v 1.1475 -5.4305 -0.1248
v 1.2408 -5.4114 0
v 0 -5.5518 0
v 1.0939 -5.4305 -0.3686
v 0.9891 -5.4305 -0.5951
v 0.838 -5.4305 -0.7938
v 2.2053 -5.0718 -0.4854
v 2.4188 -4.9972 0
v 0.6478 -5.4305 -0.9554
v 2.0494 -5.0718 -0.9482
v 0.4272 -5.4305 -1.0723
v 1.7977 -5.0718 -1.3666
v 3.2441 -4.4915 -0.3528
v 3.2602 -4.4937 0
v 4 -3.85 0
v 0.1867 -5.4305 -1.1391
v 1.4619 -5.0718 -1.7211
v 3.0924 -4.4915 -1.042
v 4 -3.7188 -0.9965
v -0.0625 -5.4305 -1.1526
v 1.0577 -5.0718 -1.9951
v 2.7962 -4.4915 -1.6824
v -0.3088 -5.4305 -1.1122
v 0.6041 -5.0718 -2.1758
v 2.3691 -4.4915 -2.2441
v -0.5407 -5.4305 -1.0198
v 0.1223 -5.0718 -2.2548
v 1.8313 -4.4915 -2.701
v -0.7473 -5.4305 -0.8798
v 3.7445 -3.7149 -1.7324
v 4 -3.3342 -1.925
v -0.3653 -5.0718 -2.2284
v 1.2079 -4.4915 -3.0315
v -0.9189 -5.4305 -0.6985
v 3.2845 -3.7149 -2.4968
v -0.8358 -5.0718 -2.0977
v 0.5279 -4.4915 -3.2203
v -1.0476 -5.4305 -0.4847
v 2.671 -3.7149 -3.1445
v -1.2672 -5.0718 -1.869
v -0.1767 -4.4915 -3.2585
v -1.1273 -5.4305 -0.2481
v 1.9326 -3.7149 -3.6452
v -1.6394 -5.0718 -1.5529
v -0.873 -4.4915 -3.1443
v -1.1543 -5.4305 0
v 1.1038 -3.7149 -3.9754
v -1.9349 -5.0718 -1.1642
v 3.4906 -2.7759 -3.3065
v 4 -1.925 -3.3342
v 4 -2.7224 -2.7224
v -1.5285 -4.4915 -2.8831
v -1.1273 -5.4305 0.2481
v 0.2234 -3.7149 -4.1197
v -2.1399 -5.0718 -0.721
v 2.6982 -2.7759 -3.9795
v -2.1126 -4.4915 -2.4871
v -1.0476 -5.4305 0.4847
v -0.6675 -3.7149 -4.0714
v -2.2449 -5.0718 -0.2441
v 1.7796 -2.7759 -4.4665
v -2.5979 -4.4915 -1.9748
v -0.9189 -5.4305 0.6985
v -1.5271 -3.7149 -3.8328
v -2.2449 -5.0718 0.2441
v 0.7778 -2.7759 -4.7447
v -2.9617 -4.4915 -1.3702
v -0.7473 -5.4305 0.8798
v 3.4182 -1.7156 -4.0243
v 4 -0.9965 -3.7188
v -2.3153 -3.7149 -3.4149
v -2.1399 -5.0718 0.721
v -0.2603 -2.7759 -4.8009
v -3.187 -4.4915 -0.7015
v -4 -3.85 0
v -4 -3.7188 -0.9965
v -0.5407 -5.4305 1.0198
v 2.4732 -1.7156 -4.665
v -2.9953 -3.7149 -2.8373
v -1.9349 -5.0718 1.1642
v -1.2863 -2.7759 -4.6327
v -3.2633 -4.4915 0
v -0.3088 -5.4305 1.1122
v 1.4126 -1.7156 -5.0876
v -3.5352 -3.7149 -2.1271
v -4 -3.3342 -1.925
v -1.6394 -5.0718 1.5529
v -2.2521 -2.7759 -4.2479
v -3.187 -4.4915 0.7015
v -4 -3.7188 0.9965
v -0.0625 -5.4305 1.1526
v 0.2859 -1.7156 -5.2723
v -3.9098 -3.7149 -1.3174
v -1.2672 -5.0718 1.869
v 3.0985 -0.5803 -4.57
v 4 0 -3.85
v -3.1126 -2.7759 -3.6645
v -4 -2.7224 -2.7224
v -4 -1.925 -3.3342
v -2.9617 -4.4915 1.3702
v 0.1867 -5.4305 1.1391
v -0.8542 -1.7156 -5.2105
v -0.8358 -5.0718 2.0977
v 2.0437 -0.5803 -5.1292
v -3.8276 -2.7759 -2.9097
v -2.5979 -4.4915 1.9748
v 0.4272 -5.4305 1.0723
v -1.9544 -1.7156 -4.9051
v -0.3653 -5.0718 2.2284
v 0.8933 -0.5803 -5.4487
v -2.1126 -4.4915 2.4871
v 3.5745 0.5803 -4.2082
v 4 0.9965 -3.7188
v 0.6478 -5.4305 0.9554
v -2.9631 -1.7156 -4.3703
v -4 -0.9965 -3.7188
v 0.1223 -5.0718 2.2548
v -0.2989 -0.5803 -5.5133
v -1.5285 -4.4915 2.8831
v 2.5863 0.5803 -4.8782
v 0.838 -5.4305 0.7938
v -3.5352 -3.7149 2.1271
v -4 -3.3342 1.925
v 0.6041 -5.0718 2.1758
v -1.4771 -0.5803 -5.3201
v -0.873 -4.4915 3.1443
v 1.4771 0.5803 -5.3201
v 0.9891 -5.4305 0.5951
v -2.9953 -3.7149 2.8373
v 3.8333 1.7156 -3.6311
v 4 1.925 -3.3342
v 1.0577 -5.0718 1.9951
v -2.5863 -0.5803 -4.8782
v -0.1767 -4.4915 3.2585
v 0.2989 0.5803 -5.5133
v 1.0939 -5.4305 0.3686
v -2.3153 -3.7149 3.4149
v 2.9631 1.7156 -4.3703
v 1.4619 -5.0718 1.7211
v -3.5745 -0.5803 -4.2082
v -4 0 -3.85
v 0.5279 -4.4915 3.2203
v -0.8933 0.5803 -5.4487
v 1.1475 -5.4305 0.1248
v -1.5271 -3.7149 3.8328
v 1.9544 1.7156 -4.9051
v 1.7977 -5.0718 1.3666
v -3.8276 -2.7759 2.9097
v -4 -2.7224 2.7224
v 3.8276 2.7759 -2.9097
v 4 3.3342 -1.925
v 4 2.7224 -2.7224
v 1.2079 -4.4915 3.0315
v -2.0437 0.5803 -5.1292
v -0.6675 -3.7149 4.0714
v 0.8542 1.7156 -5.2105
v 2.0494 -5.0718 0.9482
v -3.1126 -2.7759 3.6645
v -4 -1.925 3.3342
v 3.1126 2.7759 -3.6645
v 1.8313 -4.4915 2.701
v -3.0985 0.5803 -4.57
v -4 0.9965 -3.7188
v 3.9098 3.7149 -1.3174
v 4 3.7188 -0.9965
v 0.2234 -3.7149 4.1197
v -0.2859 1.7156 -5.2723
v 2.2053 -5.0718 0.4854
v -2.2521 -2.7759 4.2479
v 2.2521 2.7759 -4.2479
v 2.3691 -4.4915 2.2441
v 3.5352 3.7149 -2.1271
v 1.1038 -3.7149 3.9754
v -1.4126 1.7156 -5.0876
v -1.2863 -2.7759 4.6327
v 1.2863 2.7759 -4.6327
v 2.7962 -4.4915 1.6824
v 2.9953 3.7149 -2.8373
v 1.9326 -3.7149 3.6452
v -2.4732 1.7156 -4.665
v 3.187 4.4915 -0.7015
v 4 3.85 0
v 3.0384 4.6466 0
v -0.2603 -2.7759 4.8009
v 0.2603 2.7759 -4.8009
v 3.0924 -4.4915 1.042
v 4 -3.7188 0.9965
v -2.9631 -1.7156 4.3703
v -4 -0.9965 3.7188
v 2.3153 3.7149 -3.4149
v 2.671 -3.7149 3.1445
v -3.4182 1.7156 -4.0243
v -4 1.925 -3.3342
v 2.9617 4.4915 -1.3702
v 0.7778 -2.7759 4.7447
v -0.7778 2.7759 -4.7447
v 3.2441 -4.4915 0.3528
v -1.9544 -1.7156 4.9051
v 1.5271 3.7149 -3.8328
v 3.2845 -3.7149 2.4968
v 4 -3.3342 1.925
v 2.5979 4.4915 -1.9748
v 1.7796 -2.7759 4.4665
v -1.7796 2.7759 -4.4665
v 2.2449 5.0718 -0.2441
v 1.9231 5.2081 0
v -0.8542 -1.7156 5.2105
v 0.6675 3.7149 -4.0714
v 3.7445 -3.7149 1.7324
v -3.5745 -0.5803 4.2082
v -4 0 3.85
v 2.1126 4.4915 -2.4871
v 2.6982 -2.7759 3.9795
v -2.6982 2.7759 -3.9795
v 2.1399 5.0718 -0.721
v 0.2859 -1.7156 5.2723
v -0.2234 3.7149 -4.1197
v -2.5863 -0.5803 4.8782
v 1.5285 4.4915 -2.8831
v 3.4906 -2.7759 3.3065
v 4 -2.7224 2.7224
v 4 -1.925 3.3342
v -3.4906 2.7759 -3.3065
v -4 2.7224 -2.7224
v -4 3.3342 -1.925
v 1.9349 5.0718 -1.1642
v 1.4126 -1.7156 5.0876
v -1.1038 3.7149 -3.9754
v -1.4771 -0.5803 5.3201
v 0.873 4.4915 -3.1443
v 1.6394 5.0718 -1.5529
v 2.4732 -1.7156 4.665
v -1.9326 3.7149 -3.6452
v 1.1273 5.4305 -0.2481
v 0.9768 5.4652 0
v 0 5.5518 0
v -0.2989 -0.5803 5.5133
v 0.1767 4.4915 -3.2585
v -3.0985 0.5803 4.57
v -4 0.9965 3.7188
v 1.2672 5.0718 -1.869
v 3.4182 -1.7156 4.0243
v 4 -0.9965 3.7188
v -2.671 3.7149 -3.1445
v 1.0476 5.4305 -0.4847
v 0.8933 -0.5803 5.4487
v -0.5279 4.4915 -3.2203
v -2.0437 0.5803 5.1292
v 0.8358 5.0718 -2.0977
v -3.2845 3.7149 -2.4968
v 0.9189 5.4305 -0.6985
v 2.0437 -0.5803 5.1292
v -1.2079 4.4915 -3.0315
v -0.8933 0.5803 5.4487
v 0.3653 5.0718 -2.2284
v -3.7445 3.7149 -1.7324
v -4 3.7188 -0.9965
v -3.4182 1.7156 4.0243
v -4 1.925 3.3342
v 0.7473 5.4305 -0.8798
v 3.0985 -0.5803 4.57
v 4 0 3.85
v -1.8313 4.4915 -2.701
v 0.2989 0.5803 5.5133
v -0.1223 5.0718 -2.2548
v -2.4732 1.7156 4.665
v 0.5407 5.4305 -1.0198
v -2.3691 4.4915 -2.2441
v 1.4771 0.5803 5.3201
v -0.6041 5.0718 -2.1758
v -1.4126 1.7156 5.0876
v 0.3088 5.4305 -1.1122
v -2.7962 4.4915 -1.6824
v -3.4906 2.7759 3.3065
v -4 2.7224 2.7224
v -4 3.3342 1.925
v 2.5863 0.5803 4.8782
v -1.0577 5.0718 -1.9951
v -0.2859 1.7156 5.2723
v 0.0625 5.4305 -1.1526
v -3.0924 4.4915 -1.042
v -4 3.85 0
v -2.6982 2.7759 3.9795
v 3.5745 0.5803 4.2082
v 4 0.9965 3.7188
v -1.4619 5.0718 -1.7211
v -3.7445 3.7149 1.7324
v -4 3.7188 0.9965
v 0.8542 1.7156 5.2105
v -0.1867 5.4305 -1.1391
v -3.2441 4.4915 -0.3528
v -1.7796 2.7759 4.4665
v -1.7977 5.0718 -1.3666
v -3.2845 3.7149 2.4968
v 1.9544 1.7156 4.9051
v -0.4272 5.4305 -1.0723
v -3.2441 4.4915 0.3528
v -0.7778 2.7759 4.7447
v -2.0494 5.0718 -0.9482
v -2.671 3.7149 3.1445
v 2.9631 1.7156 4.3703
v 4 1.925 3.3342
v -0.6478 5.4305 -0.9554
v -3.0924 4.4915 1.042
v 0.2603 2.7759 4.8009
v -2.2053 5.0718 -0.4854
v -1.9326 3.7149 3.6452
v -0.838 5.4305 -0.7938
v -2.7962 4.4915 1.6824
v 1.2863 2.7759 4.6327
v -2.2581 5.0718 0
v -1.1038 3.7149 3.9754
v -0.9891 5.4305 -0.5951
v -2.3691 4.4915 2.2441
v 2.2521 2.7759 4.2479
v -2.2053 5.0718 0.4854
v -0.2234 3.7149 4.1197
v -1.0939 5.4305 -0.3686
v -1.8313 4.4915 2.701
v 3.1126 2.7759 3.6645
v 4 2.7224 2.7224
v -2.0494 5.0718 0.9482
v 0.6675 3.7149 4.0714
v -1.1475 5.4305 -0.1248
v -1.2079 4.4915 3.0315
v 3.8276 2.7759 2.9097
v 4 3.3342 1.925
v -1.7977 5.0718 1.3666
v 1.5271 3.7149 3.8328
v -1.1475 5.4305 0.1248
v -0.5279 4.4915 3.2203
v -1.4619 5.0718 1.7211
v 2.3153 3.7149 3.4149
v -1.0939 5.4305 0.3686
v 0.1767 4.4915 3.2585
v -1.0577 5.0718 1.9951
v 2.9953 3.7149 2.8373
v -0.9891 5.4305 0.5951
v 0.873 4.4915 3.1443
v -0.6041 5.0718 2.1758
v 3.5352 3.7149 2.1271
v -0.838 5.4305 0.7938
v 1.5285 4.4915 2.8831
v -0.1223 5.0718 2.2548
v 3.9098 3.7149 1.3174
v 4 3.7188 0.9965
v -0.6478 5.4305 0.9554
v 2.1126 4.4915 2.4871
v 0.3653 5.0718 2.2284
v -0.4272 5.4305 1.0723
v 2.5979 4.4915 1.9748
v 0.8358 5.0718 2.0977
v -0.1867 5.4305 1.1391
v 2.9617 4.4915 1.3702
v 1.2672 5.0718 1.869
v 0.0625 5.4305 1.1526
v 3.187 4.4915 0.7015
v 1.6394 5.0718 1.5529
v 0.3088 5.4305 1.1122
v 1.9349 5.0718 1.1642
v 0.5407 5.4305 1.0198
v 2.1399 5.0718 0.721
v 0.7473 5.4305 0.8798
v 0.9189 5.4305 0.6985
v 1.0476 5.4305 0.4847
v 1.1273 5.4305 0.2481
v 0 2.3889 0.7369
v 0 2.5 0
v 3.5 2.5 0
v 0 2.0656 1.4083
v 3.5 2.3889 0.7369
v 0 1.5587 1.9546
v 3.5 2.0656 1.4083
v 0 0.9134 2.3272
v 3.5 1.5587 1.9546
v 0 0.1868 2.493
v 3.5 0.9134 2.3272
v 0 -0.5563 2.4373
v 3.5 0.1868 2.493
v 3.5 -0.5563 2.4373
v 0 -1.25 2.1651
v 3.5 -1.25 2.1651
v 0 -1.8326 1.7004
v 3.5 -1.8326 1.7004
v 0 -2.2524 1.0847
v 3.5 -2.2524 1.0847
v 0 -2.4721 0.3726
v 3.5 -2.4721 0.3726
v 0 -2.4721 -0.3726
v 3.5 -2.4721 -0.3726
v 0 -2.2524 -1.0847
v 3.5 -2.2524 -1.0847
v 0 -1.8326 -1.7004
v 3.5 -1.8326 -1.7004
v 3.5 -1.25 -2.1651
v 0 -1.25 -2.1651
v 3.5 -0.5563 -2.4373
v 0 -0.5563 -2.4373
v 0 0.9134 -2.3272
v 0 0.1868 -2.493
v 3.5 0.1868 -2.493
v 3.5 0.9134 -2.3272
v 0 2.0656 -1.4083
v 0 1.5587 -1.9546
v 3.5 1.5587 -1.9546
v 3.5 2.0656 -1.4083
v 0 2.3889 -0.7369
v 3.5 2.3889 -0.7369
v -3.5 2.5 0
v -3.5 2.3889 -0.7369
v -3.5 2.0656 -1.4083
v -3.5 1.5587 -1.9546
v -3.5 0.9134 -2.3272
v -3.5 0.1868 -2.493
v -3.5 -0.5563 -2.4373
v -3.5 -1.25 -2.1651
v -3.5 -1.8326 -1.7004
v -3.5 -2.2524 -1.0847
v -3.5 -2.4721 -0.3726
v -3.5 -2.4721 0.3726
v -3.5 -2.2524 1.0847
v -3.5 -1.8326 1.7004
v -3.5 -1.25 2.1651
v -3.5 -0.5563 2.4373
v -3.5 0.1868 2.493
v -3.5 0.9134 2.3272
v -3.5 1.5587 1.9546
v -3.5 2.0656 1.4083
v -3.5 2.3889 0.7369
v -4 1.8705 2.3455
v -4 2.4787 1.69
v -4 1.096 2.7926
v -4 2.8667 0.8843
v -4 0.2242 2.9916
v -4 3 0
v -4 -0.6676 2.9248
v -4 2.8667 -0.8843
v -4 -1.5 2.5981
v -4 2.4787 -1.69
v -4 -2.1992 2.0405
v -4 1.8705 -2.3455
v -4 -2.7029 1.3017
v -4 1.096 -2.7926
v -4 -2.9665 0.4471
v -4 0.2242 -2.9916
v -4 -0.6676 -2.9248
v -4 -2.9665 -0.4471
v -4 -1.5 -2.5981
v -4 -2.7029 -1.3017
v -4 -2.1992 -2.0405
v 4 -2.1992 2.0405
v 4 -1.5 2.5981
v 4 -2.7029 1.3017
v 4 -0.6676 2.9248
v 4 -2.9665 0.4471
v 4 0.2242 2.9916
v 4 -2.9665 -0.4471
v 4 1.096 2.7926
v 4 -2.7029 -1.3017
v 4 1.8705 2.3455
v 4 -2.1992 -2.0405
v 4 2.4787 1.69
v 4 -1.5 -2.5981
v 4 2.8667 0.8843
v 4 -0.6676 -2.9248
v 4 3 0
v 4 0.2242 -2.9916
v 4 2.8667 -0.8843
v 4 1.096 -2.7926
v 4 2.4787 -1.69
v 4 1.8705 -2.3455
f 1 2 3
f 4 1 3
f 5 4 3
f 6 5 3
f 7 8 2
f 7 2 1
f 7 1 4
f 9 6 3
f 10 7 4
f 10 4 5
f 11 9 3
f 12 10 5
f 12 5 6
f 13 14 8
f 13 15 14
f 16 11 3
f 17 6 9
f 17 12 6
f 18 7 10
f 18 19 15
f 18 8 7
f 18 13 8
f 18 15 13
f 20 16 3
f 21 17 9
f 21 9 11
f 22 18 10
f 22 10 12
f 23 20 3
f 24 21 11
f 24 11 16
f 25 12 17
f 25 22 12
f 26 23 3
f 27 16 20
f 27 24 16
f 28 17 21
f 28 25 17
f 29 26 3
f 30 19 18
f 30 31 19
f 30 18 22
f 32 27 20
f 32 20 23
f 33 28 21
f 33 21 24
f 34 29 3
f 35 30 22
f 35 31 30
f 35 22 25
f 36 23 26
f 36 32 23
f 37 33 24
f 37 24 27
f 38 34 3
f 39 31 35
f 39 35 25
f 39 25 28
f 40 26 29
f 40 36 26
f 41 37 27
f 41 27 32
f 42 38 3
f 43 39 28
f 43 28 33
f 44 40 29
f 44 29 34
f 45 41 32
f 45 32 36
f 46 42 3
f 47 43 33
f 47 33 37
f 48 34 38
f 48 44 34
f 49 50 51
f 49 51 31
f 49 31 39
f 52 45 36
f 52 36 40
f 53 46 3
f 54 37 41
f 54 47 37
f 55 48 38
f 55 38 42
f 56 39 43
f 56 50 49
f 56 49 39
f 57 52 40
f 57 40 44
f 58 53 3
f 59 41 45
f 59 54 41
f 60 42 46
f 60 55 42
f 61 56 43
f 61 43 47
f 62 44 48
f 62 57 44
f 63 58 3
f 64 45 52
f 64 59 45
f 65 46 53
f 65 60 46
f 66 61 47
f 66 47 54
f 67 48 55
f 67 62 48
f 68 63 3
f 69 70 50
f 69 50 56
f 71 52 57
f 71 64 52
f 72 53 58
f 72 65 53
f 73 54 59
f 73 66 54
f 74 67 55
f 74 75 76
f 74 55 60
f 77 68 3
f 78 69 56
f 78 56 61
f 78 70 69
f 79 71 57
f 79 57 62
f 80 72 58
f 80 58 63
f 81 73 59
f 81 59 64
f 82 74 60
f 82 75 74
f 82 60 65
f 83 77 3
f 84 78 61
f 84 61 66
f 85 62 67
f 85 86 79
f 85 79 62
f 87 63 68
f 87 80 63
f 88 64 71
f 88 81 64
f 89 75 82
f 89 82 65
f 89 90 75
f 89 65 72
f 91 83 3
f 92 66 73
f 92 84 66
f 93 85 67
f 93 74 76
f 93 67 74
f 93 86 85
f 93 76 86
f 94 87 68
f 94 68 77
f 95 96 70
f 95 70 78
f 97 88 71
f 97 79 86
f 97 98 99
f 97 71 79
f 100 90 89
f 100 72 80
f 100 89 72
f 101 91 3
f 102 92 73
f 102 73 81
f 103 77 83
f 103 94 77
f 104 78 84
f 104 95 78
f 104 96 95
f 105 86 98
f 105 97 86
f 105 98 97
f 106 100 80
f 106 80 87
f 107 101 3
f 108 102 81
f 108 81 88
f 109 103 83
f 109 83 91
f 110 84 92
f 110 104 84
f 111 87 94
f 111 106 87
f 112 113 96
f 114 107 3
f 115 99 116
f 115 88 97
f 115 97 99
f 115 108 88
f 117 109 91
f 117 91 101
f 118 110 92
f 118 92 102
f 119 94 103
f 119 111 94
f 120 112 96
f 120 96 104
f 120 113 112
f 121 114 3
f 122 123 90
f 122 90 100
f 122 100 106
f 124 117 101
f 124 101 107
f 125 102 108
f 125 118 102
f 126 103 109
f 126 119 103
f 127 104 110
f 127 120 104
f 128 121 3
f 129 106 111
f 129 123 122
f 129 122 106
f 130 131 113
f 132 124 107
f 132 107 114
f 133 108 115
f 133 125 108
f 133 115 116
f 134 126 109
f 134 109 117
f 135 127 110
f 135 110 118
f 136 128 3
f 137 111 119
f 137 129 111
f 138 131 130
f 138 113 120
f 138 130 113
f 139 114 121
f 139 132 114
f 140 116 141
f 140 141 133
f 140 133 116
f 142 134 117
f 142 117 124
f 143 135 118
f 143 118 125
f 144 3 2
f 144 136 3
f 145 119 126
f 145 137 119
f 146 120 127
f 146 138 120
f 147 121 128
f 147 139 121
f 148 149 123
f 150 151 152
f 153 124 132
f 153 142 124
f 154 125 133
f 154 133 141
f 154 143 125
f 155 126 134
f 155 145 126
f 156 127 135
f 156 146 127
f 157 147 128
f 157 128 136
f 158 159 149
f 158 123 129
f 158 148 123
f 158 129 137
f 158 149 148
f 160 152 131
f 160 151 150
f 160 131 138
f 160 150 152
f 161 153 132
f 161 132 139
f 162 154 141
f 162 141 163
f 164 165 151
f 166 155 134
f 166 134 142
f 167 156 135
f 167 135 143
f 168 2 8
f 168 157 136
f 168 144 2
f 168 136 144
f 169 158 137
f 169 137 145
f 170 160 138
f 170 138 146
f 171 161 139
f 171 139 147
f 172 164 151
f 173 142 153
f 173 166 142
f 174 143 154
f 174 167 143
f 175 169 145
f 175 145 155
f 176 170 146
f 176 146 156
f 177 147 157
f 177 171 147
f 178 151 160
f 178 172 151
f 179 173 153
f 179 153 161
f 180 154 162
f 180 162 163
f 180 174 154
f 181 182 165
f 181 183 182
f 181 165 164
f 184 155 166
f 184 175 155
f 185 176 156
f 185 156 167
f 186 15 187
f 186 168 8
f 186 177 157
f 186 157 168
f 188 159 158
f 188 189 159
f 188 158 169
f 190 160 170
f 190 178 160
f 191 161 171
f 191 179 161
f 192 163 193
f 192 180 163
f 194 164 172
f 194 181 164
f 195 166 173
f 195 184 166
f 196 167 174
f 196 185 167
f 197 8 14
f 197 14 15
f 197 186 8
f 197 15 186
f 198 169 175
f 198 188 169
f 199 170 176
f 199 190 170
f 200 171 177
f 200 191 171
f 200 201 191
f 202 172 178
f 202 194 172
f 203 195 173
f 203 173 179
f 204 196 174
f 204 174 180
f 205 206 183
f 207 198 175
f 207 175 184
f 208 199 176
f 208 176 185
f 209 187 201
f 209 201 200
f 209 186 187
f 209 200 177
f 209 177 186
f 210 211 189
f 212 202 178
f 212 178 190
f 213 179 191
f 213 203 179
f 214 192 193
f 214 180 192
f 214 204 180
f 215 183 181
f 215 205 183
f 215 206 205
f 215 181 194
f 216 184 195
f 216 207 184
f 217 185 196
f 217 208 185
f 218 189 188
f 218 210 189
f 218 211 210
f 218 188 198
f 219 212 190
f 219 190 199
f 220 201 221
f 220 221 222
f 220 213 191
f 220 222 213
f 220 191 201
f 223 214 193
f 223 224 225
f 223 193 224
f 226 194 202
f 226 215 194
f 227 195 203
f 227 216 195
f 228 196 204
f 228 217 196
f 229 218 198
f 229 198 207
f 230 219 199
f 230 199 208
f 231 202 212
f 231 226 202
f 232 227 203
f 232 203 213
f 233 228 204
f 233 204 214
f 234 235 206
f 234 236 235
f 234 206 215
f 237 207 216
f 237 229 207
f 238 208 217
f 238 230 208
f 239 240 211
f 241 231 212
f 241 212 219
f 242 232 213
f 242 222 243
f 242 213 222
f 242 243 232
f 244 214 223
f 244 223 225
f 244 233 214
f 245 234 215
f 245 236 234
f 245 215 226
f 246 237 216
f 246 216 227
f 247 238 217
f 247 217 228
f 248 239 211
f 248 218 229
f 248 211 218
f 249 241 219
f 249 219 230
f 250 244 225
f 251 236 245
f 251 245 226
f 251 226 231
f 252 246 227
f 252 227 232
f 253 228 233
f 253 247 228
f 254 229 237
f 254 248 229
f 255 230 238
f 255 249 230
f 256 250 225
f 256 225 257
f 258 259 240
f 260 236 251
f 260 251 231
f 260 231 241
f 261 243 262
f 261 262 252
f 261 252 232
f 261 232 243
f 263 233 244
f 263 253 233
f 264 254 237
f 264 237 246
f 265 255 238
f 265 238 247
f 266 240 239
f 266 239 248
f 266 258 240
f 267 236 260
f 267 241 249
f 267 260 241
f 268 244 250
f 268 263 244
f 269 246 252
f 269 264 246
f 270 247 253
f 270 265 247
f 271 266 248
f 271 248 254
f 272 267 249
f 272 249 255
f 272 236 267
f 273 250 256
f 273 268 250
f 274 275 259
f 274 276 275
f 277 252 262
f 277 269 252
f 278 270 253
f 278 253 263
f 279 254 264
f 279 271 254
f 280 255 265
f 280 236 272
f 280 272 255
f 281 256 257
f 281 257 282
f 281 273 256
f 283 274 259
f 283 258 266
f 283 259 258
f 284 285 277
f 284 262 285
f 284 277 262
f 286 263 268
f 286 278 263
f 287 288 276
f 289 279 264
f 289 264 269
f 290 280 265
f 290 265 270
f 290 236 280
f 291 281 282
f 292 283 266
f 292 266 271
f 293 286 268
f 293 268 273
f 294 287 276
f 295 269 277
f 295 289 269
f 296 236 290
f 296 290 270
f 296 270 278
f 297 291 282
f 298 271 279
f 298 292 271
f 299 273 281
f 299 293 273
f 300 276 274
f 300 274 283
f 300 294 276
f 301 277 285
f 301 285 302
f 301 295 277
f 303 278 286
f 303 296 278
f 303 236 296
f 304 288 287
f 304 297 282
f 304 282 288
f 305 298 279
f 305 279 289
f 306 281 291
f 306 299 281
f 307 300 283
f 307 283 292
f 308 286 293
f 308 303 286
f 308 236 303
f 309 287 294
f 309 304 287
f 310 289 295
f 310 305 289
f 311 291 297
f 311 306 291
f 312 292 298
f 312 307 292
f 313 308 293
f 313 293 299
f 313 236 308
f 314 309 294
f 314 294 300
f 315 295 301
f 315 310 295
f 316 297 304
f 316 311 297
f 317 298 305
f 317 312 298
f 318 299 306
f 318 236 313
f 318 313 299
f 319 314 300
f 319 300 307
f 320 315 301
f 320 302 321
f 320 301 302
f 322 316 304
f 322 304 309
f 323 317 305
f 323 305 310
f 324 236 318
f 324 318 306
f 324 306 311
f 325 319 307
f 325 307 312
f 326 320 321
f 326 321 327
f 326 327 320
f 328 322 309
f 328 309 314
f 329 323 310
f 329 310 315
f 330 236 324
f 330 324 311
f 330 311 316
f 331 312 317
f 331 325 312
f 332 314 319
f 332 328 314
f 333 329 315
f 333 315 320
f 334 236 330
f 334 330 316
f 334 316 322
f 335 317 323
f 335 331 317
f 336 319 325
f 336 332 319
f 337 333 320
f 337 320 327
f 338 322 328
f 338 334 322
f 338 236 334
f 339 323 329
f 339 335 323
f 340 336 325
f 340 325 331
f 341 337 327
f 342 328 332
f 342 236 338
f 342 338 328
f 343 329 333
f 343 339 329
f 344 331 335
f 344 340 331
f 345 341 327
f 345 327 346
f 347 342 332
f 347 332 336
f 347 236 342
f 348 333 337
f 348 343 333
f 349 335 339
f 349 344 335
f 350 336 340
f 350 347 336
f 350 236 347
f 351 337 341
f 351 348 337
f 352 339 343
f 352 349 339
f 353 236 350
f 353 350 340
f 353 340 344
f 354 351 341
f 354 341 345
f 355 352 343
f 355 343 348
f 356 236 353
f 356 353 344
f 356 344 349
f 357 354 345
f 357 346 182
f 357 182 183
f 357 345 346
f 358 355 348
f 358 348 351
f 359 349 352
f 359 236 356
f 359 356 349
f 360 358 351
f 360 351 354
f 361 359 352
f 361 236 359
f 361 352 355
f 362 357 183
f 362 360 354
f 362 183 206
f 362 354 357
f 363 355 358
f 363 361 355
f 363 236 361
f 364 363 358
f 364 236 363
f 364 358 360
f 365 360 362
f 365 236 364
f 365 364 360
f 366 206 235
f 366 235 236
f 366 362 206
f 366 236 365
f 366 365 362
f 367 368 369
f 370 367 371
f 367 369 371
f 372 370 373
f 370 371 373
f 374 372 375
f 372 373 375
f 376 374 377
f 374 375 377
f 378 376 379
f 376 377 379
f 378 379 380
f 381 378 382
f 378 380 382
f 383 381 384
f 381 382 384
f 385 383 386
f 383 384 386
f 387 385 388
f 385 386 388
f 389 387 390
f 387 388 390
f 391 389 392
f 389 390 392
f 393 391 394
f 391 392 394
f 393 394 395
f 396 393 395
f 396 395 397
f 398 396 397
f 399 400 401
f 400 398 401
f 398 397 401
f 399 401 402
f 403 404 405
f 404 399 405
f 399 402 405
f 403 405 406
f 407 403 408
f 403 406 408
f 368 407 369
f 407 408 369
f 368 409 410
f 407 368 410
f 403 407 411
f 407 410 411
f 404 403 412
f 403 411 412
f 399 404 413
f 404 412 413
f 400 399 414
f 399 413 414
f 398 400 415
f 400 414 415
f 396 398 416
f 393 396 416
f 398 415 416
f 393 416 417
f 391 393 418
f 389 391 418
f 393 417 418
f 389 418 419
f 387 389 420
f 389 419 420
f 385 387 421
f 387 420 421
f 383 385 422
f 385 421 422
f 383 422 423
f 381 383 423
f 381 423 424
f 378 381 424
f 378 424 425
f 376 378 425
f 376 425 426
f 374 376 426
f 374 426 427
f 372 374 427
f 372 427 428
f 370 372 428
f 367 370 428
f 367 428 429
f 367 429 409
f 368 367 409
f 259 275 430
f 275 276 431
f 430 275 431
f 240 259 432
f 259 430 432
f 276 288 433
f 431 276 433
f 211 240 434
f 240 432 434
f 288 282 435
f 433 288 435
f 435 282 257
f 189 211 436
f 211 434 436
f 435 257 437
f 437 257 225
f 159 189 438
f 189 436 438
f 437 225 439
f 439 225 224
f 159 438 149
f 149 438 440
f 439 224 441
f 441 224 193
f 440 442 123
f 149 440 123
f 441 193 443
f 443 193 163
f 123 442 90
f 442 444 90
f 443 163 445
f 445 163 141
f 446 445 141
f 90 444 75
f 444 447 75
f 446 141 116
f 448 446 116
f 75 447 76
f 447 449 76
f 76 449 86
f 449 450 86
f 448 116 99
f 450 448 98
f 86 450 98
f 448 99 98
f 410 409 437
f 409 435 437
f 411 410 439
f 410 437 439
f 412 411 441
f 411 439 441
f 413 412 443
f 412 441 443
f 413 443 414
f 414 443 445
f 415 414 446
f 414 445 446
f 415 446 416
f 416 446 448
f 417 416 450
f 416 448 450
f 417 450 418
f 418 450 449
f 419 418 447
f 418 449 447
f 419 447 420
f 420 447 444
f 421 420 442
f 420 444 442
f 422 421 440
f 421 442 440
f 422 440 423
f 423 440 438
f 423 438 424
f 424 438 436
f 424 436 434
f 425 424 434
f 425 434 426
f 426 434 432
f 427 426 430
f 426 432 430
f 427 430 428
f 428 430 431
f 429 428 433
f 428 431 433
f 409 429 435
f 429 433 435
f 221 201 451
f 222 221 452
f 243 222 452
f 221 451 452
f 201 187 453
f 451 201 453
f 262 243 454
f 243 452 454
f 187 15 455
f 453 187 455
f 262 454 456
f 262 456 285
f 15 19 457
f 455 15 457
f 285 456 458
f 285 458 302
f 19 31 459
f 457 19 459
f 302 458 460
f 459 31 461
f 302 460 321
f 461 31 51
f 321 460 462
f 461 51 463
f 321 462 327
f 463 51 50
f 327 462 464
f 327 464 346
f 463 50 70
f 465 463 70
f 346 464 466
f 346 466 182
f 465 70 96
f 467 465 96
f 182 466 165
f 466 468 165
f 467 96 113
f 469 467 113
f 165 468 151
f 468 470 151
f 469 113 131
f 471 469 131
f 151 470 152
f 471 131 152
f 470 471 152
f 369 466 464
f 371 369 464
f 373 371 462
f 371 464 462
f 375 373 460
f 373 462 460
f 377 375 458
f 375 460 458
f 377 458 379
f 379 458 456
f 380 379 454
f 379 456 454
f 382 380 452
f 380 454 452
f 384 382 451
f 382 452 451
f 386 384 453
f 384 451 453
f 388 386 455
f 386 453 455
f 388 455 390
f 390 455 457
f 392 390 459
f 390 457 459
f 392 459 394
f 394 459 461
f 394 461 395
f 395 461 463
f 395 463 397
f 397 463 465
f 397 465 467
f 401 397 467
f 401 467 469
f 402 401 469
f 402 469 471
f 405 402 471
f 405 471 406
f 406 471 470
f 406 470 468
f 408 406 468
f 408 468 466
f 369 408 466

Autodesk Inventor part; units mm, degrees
ref_plane "YZ Plane" through (0, 0, 0) normal (1, 0, 0) x (0, 1, 0)
ref_plane "XZ Plane" through (0, 0, 0) normal (0, 1, 0) x (-1, 0, 0)
ref_plane "XY Plane" through (0, 0, 0) normal (0, 0, 1) x (1, 0, 0)
sketch "Sketch1" plane through (0, 0, 0) normal (0, 0, 1) x (1, 0, 0)
  line L0 (0, 3.85) -> (0, -3.85)
  line L1 (0, -3.85) -> (4, -3.85)
  line L2 (4, -3.85) -> (4, 3.85)
  line L3 (4, 3.85) -> (0, 3.85)
  arc A0 (0, -5.5518) -> (0, 5.5518) centre (0, 0) ccw
  line L4 (0, 5.5518) -> (0, -5.5518)
  line L5 (4, 5.5518) -> (6, 5.5518)
  line L6 (6, 5.5518) -> (6, -5.5518)
  line L7 (6, -5.5518) -> (4, -5.5518)
  line L8 (4, -5.5518) -> (4, 5.5518)
  line L9 (0, 2.5) -> (6, 2.5)
  line L10 (6, 2.5) -> (6, 0)
  line L11 (6, 0) -> (0, 0)
  line L12 (0, 0) -> (0, 2.5)
  dimension "d0" = 7.7
  dimension "d2" = 4
  dimension "d3" = 3.85
  dimension "d4" = 2
  dimension "d5" = 2
  dimension "d6" = 6
  dimension "d7" = 6
  dimension "d8" = 2.5
  dimension "d9" = 2.5
revolve "Revolution1" add sketch "Sketch1" angle 360 about axis through (0, 5.5518, 0) along (0, -1, 0) contours L3 L2 L9 L0 | L4 A0 L3 | L9 L2 L11 L0 | A0 L9 L2 | L11 L2 L1 L0 | L9 A0 L11 L2 | L1 A0 L4 | L11 A0 L2
extrude "Extrusion1" cut sketch "Sketch1" along normal mid plane 10 contours A0 L9 L2 | L8 L5 L6 L9 A0 | L9 A0 L11 L2 | L9 L6 L11 A0 | L11 A0 L2 | L11 L6 L7 L8 A0
mirror "Mirror1" about plane through (0, 0, 0) normal (1, 0, 0) of "Extrusion1"
revolve "Revolution2" cut sketch "Sketch1" angle 360 about axis through (6, 0, 0) along (-1, 0, 0) contours L9 L2 L11 L0 | L9 A0 L11 L2 | L9 L6 L11 A0
mirror "Mirror2" about plane through (0, 1.25, 0) normal (1, 0, 0) of "Revolution2"
chamfer "Chamfer1" distance 0.5 angle 45 2 edges at (-4, -2.5, 0) (4, -2.5, 0)
properties part number "KULA" material "Stainless Steel"
